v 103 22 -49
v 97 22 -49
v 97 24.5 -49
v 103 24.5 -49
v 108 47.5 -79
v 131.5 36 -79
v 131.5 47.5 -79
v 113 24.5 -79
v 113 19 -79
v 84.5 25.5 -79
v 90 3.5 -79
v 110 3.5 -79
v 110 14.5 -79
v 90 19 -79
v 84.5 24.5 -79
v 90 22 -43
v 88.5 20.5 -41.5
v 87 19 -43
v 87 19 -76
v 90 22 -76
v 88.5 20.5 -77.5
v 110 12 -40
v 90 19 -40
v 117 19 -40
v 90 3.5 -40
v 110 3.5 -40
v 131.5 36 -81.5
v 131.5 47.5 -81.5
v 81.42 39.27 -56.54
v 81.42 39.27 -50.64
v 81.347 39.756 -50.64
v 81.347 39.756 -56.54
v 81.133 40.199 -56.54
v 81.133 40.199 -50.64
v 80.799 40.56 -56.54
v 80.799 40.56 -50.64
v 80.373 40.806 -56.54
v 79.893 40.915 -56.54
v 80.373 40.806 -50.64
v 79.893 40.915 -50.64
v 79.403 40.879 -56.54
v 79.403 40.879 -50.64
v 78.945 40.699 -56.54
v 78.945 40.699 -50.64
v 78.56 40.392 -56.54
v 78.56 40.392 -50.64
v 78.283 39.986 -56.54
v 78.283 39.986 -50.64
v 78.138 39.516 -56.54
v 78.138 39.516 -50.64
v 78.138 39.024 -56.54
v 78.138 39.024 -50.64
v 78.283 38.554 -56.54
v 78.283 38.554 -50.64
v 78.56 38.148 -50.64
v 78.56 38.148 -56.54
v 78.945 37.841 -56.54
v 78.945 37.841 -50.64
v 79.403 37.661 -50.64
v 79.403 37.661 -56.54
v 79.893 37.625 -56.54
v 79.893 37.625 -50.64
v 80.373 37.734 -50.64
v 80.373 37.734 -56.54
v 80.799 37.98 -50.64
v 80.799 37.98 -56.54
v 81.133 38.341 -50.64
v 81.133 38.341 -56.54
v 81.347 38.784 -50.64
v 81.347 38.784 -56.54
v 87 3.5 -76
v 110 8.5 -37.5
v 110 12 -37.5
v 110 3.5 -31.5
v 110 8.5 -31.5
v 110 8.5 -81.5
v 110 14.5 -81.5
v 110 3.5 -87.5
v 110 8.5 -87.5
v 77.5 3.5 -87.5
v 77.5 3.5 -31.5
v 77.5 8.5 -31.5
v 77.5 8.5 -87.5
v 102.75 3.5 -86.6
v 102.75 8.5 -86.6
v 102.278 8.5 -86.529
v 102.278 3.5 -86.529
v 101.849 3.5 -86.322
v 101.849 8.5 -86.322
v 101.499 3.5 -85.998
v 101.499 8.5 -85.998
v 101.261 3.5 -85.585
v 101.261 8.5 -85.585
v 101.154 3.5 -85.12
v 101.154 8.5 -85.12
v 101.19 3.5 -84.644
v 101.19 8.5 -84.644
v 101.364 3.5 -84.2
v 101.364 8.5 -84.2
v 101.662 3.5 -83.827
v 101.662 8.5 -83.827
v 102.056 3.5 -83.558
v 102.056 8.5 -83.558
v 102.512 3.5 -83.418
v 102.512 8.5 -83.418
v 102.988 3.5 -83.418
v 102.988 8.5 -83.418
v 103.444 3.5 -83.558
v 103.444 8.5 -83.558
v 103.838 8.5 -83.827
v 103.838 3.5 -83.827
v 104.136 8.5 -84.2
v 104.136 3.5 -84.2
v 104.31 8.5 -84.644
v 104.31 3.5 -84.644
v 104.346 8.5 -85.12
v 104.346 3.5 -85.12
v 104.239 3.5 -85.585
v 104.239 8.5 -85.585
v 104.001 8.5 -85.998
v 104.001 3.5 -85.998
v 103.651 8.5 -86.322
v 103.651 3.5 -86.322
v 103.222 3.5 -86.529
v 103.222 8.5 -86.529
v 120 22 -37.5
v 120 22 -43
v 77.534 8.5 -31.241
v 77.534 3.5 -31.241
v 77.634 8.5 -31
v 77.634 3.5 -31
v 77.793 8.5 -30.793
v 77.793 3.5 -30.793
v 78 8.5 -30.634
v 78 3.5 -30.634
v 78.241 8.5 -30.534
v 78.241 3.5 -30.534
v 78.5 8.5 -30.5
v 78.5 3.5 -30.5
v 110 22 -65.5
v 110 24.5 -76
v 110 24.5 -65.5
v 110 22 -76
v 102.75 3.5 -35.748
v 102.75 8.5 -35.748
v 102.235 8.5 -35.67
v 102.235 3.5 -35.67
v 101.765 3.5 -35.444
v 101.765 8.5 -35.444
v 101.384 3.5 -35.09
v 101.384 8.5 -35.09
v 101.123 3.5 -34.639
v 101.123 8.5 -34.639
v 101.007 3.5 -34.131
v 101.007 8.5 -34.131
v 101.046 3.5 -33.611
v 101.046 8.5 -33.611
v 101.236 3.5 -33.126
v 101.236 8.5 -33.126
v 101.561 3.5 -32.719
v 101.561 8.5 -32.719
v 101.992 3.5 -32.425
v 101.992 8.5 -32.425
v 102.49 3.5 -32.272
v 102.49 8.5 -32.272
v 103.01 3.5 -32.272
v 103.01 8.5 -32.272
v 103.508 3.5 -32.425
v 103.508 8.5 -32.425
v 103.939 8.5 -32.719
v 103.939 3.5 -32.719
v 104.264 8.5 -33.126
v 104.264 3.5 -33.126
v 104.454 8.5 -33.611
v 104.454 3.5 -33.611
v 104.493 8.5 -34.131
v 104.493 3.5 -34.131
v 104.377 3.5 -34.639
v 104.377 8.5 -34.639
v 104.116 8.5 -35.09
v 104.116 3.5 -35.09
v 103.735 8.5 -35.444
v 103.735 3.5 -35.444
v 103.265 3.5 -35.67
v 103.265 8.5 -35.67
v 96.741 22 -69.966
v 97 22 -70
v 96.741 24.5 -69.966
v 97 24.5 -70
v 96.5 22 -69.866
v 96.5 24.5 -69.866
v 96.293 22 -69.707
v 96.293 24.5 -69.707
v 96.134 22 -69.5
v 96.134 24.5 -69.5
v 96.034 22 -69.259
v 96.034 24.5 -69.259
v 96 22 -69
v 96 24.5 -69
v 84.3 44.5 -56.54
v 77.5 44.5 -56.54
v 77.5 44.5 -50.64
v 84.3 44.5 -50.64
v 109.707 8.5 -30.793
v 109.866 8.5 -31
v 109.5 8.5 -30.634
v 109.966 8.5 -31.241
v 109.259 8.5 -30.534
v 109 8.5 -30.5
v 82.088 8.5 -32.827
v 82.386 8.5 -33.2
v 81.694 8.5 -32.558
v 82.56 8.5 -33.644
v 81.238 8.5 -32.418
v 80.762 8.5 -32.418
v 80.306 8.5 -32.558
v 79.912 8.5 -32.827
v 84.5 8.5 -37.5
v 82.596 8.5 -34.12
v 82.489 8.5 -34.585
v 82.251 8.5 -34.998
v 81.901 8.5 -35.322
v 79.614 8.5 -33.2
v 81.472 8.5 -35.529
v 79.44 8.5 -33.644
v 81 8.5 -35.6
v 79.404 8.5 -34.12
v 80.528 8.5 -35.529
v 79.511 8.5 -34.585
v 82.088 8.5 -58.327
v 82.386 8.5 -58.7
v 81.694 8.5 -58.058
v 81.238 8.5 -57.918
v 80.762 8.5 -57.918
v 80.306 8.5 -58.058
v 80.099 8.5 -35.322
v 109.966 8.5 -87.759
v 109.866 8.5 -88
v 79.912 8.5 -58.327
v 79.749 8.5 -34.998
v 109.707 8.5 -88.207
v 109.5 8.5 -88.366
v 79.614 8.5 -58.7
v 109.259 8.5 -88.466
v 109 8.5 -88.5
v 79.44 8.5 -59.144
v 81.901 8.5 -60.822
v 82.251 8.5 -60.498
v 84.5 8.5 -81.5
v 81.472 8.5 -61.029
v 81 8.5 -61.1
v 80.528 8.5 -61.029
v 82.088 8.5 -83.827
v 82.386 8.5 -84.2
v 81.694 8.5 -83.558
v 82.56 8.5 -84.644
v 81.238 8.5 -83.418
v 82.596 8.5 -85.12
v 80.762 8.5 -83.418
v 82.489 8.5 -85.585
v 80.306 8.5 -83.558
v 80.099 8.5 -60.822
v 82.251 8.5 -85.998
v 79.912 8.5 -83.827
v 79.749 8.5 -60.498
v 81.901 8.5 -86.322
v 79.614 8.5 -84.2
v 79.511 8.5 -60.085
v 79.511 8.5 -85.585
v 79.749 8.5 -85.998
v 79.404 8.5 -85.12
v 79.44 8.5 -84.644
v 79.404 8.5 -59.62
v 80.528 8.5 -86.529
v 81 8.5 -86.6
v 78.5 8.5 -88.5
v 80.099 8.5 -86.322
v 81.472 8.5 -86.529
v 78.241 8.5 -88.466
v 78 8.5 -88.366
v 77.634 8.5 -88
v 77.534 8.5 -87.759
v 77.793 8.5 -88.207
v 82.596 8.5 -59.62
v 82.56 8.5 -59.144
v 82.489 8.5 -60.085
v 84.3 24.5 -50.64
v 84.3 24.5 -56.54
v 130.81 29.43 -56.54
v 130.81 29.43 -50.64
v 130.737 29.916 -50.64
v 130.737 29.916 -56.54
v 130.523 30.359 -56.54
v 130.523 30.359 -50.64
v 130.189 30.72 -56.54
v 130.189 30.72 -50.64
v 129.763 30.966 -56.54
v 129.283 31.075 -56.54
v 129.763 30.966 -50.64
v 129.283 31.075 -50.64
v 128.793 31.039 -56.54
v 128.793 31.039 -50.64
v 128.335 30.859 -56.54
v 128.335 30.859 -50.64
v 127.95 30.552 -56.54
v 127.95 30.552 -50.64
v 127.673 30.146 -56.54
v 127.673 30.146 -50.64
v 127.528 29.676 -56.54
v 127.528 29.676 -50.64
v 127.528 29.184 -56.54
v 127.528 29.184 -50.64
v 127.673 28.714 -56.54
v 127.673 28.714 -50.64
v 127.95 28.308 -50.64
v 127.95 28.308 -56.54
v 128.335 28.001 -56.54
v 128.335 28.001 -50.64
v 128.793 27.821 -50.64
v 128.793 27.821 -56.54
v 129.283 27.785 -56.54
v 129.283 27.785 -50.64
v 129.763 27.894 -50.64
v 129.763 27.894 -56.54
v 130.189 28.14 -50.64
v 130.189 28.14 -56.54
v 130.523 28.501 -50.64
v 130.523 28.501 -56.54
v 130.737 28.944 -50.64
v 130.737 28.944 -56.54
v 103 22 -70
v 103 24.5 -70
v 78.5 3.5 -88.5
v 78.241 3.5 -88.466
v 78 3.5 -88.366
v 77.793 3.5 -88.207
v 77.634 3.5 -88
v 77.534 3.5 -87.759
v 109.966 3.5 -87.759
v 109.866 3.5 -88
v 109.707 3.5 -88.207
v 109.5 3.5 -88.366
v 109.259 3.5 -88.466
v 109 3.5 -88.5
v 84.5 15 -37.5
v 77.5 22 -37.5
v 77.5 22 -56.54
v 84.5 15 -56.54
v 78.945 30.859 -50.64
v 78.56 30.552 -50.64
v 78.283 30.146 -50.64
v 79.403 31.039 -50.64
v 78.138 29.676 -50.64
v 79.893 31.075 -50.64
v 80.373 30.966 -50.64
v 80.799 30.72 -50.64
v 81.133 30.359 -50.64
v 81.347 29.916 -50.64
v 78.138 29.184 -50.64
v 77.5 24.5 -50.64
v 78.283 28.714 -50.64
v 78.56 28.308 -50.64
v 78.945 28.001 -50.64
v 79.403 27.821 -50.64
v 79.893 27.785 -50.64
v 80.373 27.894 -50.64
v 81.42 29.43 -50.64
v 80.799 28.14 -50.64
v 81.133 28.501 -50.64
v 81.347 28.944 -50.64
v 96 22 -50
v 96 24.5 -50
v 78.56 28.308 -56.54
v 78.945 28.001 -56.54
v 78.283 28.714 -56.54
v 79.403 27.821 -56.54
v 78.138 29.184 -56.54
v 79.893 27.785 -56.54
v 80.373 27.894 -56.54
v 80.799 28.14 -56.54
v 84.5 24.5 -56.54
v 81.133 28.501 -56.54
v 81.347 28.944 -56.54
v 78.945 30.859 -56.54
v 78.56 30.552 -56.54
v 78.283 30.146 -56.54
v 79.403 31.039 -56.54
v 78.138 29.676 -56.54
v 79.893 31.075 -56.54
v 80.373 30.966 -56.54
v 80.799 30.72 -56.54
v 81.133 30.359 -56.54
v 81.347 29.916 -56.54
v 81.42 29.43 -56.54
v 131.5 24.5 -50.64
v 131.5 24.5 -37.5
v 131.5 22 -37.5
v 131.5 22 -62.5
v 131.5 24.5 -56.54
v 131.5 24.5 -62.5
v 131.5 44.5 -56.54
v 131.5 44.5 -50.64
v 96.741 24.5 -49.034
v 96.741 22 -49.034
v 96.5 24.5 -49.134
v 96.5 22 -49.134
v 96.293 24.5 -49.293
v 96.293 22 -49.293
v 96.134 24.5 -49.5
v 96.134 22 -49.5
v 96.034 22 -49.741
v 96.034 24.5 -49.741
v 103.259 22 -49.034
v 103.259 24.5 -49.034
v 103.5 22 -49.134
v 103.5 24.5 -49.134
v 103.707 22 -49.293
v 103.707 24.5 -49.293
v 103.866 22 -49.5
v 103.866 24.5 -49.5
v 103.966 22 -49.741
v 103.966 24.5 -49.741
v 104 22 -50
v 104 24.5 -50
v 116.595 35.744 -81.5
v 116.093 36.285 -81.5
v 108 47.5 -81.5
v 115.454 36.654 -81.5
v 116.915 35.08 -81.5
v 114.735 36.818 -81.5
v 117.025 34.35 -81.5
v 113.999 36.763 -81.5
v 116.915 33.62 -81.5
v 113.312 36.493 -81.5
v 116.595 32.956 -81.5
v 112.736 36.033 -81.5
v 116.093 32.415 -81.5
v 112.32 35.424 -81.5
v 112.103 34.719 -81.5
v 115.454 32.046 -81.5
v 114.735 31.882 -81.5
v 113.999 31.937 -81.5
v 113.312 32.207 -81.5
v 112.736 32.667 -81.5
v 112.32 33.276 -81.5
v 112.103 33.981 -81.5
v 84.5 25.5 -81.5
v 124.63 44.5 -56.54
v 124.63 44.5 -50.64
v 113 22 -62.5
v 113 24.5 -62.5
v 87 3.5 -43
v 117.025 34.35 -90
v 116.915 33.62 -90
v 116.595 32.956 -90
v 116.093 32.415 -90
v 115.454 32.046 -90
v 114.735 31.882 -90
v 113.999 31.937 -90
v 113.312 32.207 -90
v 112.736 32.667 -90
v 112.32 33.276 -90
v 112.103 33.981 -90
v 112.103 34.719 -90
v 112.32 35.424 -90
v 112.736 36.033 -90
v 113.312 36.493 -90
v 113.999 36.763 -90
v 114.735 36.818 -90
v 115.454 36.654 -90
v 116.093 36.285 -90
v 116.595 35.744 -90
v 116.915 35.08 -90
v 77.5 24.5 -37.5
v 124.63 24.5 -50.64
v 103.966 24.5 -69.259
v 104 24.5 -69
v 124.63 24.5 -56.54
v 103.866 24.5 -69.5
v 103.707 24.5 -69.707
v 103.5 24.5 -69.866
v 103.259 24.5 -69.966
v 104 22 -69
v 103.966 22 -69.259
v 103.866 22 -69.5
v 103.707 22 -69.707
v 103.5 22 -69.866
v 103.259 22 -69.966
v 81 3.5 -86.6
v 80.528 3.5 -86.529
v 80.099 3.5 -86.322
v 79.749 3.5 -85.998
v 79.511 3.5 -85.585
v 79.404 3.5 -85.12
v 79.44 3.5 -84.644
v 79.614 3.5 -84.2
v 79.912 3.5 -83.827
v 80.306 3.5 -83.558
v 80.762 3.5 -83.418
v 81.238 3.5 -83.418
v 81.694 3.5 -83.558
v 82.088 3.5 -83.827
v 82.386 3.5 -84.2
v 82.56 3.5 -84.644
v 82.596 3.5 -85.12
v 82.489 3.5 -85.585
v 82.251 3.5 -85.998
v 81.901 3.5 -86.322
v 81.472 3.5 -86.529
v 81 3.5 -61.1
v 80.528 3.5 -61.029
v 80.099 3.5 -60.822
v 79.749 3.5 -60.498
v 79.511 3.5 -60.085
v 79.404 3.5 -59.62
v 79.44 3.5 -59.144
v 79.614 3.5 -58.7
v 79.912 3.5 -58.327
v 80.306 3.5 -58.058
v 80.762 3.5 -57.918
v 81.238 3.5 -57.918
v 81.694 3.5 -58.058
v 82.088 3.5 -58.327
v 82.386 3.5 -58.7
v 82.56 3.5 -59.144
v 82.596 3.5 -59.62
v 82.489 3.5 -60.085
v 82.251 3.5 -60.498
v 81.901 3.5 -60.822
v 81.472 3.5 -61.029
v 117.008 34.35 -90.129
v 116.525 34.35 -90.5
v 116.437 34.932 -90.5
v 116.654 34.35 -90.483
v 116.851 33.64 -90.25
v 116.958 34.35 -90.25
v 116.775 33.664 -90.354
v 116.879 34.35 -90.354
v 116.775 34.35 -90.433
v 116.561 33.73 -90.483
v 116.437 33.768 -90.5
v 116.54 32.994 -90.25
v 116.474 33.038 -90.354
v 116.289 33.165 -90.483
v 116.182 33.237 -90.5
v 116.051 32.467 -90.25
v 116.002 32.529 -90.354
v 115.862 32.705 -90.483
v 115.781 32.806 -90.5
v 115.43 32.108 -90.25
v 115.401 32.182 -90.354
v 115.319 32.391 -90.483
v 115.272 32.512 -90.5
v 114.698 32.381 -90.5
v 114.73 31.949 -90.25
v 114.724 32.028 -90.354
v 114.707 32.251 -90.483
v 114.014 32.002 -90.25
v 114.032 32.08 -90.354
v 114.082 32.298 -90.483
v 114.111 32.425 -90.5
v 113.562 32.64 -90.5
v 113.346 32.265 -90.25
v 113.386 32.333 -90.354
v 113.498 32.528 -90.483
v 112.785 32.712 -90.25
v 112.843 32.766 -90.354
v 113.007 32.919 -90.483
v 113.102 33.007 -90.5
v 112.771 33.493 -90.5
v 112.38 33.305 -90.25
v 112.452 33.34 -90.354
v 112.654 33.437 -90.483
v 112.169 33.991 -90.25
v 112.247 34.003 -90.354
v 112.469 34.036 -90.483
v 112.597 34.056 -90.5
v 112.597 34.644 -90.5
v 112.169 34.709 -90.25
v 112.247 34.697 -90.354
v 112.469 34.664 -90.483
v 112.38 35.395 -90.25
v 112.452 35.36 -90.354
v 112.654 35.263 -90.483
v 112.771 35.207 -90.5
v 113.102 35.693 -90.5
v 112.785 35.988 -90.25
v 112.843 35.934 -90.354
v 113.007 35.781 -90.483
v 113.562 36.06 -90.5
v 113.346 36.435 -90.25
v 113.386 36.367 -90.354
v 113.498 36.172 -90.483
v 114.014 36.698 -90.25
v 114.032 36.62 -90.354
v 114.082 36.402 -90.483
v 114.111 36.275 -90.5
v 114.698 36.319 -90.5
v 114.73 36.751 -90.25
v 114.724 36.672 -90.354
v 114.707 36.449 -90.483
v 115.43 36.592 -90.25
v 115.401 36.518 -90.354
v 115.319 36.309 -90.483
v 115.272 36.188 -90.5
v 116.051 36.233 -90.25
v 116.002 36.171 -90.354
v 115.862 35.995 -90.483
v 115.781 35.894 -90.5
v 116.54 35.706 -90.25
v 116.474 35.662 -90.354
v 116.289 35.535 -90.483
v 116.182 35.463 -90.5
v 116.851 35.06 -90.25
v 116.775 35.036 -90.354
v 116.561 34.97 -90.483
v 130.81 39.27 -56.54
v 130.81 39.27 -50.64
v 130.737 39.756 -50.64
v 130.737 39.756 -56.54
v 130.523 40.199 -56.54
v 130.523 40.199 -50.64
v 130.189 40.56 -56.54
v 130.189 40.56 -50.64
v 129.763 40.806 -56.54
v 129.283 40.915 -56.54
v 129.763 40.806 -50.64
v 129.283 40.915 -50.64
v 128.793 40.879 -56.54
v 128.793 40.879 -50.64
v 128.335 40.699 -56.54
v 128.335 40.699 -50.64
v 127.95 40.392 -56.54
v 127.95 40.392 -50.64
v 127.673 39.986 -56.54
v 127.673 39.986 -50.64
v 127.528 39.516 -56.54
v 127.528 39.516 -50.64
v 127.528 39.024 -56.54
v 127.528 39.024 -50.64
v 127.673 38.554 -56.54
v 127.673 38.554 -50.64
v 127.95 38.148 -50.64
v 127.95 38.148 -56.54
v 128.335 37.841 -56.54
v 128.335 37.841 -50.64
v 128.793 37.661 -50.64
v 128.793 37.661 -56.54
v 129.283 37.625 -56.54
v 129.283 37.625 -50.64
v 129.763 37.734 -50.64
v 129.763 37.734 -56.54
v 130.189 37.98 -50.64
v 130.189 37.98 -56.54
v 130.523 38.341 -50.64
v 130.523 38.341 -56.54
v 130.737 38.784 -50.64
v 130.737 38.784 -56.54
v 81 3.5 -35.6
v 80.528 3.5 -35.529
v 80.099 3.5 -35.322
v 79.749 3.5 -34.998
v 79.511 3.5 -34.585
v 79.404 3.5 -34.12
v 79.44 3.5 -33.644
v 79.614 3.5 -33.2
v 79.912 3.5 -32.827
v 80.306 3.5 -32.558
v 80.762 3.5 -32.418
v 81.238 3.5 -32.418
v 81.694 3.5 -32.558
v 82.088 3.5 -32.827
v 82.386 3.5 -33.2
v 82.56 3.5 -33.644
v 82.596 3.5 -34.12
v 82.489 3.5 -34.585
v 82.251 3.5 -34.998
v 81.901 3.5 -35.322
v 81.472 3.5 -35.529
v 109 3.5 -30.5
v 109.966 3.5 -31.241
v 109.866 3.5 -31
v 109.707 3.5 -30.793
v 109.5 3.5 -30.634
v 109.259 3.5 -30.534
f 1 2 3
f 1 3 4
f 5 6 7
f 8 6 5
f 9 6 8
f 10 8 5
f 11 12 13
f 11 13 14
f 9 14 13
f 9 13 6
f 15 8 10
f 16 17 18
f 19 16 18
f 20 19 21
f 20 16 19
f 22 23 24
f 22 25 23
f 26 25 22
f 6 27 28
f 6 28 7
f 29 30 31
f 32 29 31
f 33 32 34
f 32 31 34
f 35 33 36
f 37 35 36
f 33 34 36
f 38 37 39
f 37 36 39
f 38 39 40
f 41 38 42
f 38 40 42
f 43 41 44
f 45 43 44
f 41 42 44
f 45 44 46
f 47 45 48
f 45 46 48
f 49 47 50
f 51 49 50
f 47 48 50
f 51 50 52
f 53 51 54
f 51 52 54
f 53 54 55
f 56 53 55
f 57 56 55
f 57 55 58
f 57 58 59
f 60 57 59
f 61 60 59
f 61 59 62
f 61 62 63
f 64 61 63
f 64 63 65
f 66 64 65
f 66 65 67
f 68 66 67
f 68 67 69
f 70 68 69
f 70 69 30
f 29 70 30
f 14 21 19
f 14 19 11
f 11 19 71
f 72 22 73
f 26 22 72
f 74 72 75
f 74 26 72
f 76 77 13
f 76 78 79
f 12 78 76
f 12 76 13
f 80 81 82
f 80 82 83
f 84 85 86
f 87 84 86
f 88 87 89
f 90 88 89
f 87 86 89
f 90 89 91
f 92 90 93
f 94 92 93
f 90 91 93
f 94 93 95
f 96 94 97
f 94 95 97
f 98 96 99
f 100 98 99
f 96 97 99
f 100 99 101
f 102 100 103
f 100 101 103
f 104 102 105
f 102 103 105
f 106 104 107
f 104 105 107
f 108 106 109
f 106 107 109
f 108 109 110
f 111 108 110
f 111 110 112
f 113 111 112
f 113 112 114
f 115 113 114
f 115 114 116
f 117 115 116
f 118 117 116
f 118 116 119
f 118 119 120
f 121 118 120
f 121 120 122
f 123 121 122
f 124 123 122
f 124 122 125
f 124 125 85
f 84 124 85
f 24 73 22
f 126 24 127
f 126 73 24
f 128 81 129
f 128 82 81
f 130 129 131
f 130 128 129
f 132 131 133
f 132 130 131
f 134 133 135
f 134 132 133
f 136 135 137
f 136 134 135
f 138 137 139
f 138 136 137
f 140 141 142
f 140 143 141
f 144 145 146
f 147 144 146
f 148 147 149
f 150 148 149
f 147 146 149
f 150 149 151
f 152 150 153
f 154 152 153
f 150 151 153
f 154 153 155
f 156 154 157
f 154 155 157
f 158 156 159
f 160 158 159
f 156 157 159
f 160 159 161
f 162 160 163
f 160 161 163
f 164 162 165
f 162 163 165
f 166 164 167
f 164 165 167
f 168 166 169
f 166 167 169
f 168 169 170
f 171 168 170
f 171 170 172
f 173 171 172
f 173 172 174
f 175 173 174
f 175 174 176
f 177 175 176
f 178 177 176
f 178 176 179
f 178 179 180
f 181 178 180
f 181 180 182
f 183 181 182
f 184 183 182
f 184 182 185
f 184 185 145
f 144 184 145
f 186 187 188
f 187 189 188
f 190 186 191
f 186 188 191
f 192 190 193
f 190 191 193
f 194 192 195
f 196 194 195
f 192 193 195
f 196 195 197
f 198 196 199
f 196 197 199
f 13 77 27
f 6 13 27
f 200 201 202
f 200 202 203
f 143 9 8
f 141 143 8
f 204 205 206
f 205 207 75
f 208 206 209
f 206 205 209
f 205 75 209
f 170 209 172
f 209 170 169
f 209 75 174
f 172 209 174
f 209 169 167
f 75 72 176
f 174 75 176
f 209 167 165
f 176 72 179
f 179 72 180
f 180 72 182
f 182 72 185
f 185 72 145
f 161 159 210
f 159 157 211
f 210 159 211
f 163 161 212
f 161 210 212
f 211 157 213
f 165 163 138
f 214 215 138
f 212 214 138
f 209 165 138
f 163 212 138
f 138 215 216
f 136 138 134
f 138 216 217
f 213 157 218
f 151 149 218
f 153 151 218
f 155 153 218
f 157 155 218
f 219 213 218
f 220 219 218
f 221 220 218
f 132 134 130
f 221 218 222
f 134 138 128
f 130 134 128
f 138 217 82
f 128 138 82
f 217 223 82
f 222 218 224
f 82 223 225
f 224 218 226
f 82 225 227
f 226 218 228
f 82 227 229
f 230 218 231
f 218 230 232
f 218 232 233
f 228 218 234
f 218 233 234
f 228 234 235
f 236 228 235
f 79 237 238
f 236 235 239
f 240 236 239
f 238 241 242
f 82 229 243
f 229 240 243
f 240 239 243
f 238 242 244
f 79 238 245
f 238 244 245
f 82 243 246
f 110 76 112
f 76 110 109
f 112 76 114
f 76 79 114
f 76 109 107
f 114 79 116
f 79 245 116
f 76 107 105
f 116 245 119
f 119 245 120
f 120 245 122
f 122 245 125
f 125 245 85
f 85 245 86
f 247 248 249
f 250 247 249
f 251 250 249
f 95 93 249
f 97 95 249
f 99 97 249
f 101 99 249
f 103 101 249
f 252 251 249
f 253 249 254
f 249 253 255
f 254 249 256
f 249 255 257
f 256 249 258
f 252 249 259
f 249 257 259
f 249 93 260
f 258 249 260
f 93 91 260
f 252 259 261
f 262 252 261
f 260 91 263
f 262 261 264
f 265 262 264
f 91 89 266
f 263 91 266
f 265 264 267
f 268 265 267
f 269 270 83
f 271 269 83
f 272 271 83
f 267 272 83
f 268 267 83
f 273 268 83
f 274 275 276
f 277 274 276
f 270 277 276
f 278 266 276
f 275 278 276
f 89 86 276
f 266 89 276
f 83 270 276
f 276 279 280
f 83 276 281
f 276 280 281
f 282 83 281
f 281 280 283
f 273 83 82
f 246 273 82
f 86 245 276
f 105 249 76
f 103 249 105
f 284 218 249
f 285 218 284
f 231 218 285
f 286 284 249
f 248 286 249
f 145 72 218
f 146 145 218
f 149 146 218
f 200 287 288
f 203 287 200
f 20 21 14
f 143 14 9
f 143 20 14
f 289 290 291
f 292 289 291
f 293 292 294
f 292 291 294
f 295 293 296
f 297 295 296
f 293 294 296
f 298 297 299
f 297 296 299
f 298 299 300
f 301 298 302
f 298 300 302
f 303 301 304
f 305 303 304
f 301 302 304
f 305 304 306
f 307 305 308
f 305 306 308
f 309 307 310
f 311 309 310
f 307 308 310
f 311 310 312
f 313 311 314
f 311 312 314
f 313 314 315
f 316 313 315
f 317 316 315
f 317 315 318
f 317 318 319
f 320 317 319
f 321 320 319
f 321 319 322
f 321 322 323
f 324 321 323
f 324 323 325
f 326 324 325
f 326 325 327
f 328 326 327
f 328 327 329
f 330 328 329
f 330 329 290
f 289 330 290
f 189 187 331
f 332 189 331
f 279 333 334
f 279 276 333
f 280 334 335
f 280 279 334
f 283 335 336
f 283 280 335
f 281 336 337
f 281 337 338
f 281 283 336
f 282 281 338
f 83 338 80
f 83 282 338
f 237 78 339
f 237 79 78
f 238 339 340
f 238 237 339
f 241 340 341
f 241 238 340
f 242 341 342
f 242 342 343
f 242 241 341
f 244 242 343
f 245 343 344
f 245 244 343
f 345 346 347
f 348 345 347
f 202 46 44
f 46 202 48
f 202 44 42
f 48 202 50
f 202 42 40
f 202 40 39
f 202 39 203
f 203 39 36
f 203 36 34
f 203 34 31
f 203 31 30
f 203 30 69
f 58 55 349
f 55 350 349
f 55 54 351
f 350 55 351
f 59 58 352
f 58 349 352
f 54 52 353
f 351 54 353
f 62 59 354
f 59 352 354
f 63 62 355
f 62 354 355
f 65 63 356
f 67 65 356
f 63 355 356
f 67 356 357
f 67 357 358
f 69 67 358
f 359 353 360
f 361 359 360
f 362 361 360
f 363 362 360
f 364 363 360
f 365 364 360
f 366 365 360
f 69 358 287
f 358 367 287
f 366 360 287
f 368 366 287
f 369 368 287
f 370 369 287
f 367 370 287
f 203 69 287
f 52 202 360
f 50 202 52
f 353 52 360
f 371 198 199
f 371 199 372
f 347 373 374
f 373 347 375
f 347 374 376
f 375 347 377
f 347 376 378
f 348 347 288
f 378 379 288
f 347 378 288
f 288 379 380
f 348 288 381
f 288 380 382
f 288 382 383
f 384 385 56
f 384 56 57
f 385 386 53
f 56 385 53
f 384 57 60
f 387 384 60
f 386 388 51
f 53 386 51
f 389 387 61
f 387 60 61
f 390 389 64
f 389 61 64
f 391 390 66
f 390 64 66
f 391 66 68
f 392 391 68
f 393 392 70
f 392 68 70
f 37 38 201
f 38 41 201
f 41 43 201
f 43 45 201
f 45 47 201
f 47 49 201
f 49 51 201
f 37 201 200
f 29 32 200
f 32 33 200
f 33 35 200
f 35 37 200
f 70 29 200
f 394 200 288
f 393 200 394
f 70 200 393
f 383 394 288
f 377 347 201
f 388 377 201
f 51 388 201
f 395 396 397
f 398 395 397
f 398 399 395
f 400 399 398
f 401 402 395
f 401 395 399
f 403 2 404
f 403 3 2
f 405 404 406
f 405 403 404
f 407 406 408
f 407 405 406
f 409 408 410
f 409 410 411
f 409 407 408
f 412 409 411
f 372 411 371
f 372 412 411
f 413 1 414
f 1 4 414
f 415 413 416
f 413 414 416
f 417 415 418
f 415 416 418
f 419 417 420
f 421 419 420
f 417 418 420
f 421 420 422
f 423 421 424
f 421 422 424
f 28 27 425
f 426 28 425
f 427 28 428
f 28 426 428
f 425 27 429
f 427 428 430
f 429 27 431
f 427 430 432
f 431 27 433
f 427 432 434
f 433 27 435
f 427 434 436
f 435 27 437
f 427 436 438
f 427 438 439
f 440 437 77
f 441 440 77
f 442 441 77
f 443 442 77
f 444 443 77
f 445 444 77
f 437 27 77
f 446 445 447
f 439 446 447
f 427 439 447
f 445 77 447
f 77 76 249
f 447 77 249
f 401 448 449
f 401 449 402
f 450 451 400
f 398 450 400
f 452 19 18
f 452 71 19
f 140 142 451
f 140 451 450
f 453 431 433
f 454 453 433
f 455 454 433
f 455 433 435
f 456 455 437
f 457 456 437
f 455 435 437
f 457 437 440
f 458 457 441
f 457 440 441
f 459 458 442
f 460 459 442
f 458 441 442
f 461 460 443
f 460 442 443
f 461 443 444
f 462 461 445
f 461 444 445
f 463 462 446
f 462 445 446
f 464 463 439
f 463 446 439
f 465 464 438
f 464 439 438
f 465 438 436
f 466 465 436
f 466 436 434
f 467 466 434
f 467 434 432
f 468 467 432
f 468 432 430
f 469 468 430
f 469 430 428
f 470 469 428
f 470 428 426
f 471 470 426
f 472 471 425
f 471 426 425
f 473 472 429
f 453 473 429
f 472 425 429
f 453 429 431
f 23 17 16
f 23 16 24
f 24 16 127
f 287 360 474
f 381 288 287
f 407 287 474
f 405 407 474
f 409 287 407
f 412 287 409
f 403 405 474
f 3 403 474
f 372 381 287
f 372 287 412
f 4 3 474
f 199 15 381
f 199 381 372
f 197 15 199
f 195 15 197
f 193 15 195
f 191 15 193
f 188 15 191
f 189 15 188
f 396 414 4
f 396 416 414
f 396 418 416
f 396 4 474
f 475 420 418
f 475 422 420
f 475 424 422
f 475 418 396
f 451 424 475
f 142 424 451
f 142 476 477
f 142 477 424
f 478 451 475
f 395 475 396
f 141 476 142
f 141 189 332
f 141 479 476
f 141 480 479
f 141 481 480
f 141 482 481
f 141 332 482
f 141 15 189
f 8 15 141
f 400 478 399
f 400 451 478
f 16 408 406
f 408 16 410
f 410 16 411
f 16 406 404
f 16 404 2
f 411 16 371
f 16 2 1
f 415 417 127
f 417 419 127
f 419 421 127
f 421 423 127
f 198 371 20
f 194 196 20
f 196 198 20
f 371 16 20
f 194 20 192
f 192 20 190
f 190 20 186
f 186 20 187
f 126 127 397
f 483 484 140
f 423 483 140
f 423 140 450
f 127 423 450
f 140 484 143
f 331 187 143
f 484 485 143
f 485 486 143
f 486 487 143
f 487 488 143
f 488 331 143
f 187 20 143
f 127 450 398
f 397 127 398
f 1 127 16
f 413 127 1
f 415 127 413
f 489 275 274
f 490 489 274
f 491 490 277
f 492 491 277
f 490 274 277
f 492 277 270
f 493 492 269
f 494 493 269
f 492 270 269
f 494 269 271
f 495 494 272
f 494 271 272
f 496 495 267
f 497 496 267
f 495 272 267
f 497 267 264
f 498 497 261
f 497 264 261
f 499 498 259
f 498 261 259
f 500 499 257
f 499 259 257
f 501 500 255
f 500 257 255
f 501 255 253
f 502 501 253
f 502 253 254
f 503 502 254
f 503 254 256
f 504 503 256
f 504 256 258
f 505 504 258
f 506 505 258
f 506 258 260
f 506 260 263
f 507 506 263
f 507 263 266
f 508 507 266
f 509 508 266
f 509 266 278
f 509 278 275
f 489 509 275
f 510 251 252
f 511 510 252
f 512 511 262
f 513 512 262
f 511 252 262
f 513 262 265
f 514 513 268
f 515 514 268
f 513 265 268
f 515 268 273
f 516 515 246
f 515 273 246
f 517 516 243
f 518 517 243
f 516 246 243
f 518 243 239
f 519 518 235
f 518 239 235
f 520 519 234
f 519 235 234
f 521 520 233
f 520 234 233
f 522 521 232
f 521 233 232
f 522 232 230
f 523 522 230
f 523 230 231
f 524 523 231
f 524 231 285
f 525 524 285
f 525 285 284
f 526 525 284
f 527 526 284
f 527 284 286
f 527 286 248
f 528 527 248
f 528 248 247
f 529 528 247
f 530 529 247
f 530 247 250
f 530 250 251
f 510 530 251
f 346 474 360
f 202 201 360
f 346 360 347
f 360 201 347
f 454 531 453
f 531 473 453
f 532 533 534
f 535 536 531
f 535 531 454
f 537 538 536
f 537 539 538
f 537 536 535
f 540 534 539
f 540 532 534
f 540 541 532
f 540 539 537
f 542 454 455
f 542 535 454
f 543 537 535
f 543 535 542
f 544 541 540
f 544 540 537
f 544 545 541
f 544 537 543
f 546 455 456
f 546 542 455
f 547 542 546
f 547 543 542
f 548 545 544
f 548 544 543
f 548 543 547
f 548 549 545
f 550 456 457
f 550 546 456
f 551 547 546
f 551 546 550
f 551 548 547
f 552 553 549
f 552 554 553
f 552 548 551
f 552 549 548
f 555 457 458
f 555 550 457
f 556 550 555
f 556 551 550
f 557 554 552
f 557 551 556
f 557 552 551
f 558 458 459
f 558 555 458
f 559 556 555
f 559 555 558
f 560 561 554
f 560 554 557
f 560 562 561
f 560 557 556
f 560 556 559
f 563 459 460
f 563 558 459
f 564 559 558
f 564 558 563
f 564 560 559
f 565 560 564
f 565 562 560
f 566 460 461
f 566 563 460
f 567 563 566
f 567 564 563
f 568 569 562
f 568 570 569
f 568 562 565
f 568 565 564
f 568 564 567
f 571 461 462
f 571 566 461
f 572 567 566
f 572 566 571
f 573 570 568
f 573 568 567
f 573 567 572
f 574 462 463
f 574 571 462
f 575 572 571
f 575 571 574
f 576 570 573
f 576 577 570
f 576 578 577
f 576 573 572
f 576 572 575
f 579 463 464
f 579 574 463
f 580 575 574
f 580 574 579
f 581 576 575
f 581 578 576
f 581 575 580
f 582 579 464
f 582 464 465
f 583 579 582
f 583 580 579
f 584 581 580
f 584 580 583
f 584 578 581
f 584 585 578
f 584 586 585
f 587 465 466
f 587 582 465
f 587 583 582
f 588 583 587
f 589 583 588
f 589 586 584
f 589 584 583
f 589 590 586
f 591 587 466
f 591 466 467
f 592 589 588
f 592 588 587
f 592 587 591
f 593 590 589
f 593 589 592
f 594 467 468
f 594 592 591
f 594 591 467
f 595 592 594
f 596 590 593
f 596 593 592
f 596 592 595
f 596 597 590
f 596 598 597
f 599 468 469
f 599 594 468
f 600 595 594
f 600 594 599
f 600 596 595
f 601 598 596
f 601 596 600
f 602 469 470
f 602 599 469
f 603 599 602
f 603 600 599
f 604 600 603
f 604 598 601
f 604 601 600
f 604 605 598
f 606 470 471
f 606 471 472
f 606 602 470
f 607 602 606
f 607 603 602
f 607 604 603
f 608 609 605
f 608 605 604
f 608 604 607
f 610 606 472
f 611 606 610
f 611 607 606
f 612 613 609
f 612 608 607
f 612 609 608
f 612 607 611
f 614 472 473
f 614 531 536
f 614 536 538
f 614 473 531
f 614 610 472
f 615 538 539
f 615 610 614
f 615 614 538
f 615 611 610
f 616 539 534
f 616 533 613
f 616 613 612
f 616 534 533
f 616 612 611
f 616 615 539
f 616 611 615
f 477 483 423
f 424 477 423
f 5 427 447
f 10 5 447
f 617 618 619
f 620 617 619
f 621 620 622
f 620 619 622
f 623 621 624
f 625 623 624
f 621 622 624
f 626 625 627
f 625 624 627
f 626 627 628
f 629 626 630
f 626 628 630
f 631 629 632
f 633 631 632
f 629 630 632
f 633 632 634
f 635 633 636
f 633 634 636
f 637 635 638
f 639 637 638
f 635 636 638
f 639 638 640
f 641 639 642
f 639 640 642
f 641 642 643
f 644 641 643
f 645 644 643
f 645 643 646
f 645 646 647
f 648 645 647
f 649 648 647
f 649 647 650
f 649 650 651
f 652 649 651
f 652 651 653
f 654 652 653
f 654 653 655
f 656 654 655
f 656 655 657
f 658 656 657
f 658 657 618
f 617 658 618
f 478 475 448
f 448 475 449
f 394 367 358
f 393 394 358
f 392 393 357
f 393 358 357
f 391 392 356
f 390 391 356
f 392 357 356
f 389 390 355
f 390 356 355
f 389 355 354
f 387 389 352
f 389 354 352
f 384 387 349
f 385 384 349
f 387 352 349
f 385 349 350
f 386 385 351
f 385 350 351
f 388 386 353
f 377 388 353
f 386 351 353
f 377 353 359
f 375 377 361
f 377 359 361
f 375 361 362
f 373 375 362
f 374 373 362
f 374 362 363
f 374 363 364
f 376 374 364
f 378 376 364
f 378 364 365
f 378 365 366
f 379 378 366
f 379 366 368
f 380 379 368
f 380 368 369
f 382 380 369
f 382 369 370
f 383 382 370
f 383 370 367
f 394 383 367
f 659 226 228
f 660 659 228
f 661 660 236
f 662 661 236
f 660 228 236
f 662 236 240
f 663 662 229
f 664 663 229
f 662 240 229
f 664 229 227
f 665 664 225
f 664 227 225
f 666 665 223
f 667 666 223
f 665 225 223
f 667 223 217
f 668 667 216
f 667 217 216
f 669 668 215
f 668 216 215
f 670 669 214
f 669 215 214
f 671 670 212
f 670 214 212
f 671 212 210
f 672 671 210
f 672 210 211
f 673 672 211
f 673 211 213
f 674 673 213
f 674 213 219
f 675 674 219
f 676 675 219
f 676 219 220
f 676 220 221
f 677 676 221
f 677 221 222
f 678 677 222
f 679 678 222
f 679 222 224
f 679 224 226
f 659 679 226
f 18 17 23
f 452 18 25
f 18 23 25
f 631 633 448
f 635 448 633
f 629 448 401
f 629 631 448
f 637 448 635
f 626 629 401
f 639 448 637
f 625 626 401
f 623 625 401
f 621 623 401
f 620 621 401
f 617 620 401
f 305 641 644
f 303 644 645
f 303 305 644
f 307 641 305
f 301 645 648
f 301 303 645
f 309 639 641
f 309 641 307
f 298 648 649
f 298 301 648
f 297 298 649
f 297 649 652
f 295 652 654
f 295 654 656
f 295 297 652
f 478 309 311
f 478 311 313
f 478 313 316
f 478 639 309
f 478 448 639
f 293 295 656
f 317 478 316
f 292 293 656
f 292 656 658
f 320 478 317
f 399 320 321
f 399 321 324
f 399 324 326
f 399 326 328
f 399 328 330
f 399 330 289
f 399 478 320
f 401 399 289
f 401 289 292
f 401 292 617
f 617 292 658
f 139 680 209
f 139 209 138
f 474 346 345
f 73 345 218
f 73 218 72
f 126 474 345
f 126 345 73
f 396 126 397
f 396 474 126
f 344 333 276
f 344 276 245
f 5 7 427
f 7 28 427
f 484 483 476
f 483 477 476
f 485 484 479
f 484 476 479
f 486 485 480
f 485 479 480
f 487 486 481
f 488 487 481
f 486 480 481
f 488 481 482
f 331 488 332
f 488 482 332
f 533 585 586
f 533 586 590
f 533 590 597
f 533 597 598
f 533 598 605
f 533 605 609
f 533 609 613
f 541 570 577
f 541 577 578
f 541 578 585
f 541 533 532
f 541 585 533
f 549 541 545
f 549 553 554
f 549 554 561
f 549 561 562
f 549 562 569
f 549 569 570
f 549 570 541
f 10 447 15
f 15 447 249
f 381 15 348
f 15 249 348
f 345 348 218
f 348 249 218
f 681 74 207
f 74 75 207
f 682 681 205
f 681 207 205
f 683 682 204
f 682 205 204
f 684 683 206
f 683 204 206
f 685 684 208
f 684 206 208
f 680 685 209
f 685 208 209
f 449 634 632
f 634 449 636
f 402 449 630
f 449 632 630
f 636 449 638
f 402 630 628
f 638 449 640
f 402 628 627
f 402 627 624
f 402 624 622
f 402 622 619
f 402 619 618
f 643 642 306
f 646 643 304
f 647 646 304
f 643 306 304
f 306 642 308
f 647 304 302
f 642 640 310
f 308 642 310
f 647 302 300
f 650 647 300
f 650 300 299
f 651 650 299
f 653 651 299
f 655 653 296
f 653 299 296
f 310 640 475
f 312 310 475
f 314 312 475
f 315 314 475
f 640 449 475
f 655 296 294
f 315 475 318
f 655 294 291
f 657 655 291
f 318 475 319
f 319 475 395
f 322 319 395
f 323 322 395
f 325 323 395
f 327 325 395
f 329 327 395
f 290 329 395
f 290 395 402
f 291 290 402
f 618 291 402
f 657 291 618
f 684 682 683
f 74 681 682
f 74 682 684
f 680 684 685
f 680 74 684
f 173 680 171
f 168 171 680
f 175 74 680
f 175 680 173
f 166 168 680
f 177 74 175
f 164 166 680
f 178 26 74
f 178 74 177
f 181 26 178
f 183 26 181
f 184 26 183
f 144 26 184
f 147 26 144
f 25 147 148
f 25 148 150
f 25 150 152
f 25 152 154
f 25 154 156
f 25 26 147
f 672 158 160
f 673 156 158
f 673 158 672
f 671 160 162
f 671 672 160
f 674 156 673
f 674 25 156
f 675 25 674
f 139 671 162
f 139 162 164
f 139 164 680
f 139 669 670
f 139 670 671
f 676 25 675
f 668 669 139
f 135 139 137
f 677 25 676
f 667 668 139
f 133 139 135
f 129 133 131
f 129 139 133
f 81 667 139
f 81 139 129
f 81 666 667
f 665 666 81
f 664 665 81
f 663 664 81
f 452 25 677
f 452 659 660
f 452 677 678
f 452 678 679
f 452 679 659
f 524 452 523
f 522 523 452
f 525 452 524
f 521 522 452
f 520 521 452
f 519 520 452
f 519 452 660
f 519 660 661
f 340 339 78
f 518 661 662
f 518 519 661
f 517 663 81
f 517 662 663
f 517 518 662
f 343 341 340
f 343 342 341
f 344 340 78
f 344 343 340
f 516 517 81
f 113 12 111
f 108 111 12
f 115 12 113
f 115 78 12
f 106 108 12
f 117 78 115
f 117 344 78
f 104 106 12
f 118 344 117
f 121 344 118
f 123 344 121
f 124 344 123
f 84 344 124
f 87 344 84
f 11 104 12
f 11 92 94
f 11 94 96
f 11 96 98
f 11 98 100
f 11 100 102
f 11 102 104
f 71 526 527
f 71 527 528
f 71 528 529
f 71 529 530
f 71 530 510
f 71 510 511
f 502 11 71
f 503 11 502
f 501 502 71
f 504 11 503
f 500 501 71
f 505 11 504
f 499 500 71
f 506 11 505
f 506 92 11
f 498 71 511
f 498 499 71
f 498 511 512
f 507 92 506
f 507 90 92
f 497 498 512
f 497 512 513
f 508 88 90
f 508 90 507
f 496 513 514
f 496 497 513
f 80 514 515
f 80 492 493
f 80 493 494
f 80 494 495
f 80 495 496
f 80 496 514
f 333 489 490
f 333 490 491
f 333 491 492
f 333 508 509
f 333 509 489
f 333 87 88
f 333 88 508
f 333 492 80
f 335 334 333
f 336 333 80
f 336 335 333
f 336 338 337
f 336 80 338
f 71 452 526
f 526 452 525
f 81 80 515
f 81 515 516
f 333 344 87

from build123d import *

# Parameters (mm, degrees)
BOSS_EXTRUDE1_DEPTH = 3.5
BOSS_EXTRUDE2_DEPTH = 21
SKETCH3_W           = 23
SKETCH3_H           = 39
BOSS_EXTRUDE3_DEPTH = 2.5
SKETCH5_W           = 21.5
SKETCH5_H           = 25
SKETCH5_W_2         = 7.07
SKETCH5_H_2         = 19.04
BOSS_EXTRUDE5_DEPTH = 2.5
SKETCH6_W           = 7.07
SKETCH6_H           = 5.9
BOSS_EXTRUDE6_DEPTH = 20
BOSS_EXTRUDE7_DEPTH = 23
FILLET1_SIZE        = 10
SKETCH9_R           = 2.475
BOSS_EXTRUDE8_DEPTH = 9
FILLET2_R           = 0.5
SKETCH10_R          = 1.65
CUT_EXTRUDE1_DEPTH  = 9
SKETCH11_W          = 0.2
SKETCH11_H          = 20
CUT_EXTRUDE2_DEPTH  = 9
CUT_EXTRUDE3_DEPTH  = 9
FILLET3_SIZE        = 3
BOSS_EXTRUDE9_DEPTH = 5
SKETCH14_R          = 1.747814763
SKETCH14_R_2        = 1.6
CUT_EXTRUDE4_DEPTH  = 15
SKETCH15_W          = 110
SKETCH15_H          = 3.5
CUT_EXTRUDE5_DEPTH  = 150
FILLET4_SIZE        = 7
FILLET5_SIZE        = 3
FILLET6_SIZE        = 3
SKETCH17_W          = 8
SKETCH17_H          = 21
CUT_EXTRUDE6_DEPTH  = 150
FILLET7_R           = 1
FILLET8_R           = 1
FILLET9_SIZE        = 3


# Some blends are built 0.0001 mm under size
with BuildPart() as part:
    # Sketch1 → Boss-Extrude1 (new body)
    with BuildSketch(Plane(origin=(0, 0, 0), x_dir=(1, 0, 0), z_dir=(0, 1, 0))):
        Polygon((0, 40), (23, 40), (23, 79), (0, 79), (0, 100), (110, 100), (110, 79), (87, 79), (87, 40), (110, 40), (110, 20), (80, 0), (30, 0), (0, 20), align=None)
    extrude(amount=BOSS_EXTRUDE1_DEPTH)

    # Sketch2 → Boss-Extrude2 (add)
    with BuildSketch(Plane(origin=(0, 3.5, 0), x_dir=(1, 0, 0), z_dir=(0, 1, 0))):
        Polygon((0, 79), (23, 79), (23, 40), (0, 40), (0, 37.5), (25.5, 37.5), (25.5, 81.5), (0, 81.5), align=None)
        Polygon((110, 81.5), (84.5, 81.5), (84.5, 37.5), (110, 37.5), (110, 40), (87, 40), (87, 79), (110, 79), align=None)
    extrude(amount=BOSS_EXTRUDE2_DEPTH)

    # Sketch3 → Boss-Extrude3 (add)
    with BuildSketch(Plane(origin=(0, 24.5, 0), x_dir=(1, 0, 0), z_dir=(0, 1, 0))):
        with Locations((11.5, 59.5)):
            Rectangle(SKETCH3_W, SKETCH3_H)
        with Locations((98.5, 59.5)):
            Rectangle(SKETCH3_W, SKETCH3_H)
    extrude(amount=-BOSS_EXTRUDE3_DEPTH)

    # Sketch5 → Boss-Extrude5 (add)
    with BuildSketch(Plane(origin=(0, 24.5, 0), x_dir=(1, 0, 0), z_dir=(0, 1, 0))):
        with Locations((120.75, 50)):
            Rectangle(SKETCH5_W, SKETCH5_H)
        with Locations((-10.75, 50)):
            Rectangle(SKETCH5_W, SKETCH5_H)
        with Locations((29.035, 47.02)):
            Rectangle(SKETCH5_W_2, SKETCH5_H_2)
        with Locations((80.965, 47.02)):
            Rectangle(SKETCH5_W_2, SKETCH5_H_2)
    extrude(amount=-BOSS_EXTRUDE5_DEPTH)

    # Sketch6 → Boss-Extrude6 (add)
    with BuildSketch(Plane(origin=(0, 24.5, 0), x_dir=(1, 0, 0), z_dir=(0, 1, 0))):
        with Locations((29.035, 53.59)):
            Rectangle(SKETCH6_W, SKETCH6_H)
        with Locations((80.965, 53.59)):
            Rectangle(SKETCH6_W, SKETCH6_H)
        with Locations((-17.965, 53.59)):
            Rectangle(SKETCH6_W, SKETCH6_H)
        with Locations((127.965, 53.59)):
            Rectangle(SKETCH6_W, SKETCH6_H)
    extrude(amount=BOSS_EXTRUDE6_DEPTH)

    # Sketch7 → Boss-Extrude7 (add)
    with BuildSketch(Plane(origin=(0, 24.5, 0), x_dir=(1, 0, 0), z_dir=(0, 1, 0))):
        Polygon((0, 81.5), (25.5, 81.5), (25.5, 79), (0, 79), (-21.5, 79), (-21.5, 81.5), align=None)
        Polygon((110, 79), (84.5, 79), (84.5, 81.5), (110, 81.5), (131.5, 81.5), (131.5, 79), align=None)
    extrude(amount=BOSS_EXTRUDE7_DEPTH)

    # Fillet1
    # the kernel refuses this chamfer: 10 mm, written as the material it adds along each edge
    with BuildSketch(Plane(origin=(0, 22, -40), x_dir=(0.027495876610586372, -0.9996219169112968, 0), z_dir=(0, 0, 1)), Plane(origin=(110, 22, -37.5), x_dir=(-0.027495876610586317, -0.9996219169112968, 0), z_dir=(0, 0, -1)), Plane(origin=(110, 24.5, -81.5), x_dir=(0.9996219169112968, 0.027495876610586317, 0), z_dir=(0, 0, 1))) as fillet1_piece_1:
        Polygon((FILLET1_SIZE * 0.999621916911, -FILLET1_SIZE * 0.0274958766106), (-FILLET1_SIZE * 0.0274958766106, -FILLET1_SIZE * 0.999621916911), (0, 0), align=None)
    extrude(amount=2.5)
    with BuildSketch(Plane(origin=(0, 24.5, -79), x_dir=(0.027495876610586372, -0.9996219169112968, 0), z_dir=(0, 0, -1))) as fillet1_piece_2:
        Polygon((FILLET1_SIZE * 0.999621916911, FILLET1_SIZE * 0.0274958766106), (-FILLET1_SIZE * 0.0274958766106, FILLET1_SIZE * 0.999621916911), (0, 0), align=None)
    extrude(amount=2.5)

    # Sketch9 → Boss-Extrude8 (add)
    with BuildSketch(Plane(origin=(0, 0, -81.5), x_dir=(-1, 0, 0), z_dir=(0, 0, -1))):
        with Locations(Location((-114.55, 34.35, 0), (0, 0, 180))):
            Circle(SKETCH9_R)
        with Locations(Location((4.55, 34.35, 0), (0, 0, 180))):
            Circle(SKETCH9_R)
    extrude(amount=BOSS_EXTRUDE8_DEPTH)

    # Fillet2
    fillet2_edges = [part.edges().sort_by_distance(p)[0] for p in [
        (112.075, 34.35, -90.5),
        (-7.025, 34.35, -90.5),
    ]]
    fillet(fillet2_edges, radius=FILLET2_R)

    # Sketch10 → Cut-Extrude1 (cut)
    with BuildSketch(Plane.XY.offset(-50.64)):
        with Locations((129.16, 39.27)):
            Circle(SKETCH10_R)
        with Locations((129.16, 29.43)):
            Circle(SKETCH10_R)
        with Locations((79.77, 39.27)):
            Circle(SKETCH10_R)
        with Locations((79.77, 29.43)):
            Circle(SKETCH10_R)
        with Locations((-19.16, 29.43)):
            Circle(SKETCH10_R)
        with Locations((-19.16, 39.27)):
            Circle(SKETCH10_R)
        with Locations(Location((30.23, 39.27, 0), (0, 0, 180))):
            Circle(SKETCH10_R)
        with Locations(Location((30.23, 29.43, 0), (0, 0, 180))):
            Circle(SKETCH10_R)
    extrude(amount=-CUT_EXTRUDE1_DEPTH, mode=Mode.SUBTRACT)

    # Sketch11 → Cut-Extrude2 (cut)
    with BuildSketch(Plane.XY.offset(-50.64)):
        with Locations((-14.53, 34.5)):
            Rectangle(SKETCH11_W, SKETCH11_H)
        with Locations((25.6, 34.5)):
            Rectangle(SKETCH11_W, SKETCH11_H)
        with Locations((84.4, 34.5)):
            Rectangle(SKETCH11_W, SKETCH11_H)
        with Locations((124.53, 34.5)):
            Rectangle(SKETCH11_W, SKETCH11_H)
    extrude(amount=-CUT_EXTRUDE2_DEPTH, mode=Mode.SUBTRACT)

    # Sketch12 → Cut-Extrude3 (cut)
    with BuildSketch(Plane(origin=(0, 0, -81.5), x_dir=(-1, 0, 0), z_dir=(0, 0, -1))):
        Polygon((-108, 47.5), (-84.5, 25.5), (-84.5, 47.5), align=None)
        Polygon((-25.5, 25.5), (-25.5, 47.5), (-2, 47.5), align=None)
        Polygon((-120, 24.5), (-131.5, 36), (-131.5, 24.5), align=None)
        Polygon((10, 24.5), (21.5, 36), (21.5, 24.5), align=None)
    extrude(amount=-CUT_EXTRUDE3_DEPTH, mode=Mode.SUBTRACT)

    # Fillet3
    fillet3_edges = [part.edges().sort_by_distance(p)[0] for p in [
        (0, 23.25, -62.5),
        (110, 23.25, -62.5),
    ]]
    chamfer(fillet3_edges, length=FILLET3_SIZE)

    # Sketch13 → Boss-Extrude9 (add)
    with BuildSketch(Plane(origin=(0, 3.5, 0), x_dir=(1, 0, 0), z_dir=(0, 1, 0))):
        Polygon((0, 30.5), (32.5, 30.5), (32.5, 88.5), (0, 88.5), (0, 81.5), (25.5, 81.5), (25.5, 37.5), (0, 37.5), align=None)
        Polygon((84.5, 37.5), (110, 37.5), (110, 30.5), (77.5, 30.5), (77.5, 88.5), (110, 88.5), (110, 81.5), (84.5, 81.5), align=None)
    extrude(amount=BOSS_EXTRUDE9_DEPTH)

    # Sketch14 → Cut-Extrude4 (cut)
    with BuildSketch(Plane(origin=(0, 8.5, 0), x_dir=(1, 0, 0), z_dir=(0, 1, 0))):
        with Locations(Location((7.25, 34, 0), (0, 0, 270))):
            Circle(SKETCH14_R)
        with Locations(Location((7.25, 85, 0), (0, 0, 270))):
            Circle(SKETCH14_R_2)
        with Locations(Location((29, 34, 0), (0, 0, 270))):
            Circle(SKETCH14_R_2)
        with Locations(Location((29, 59.5, 0), (0, 0, 270))):
            Circle(SKETCH14_R_2)
        with Locations(Location((29, 85, 0), (0, 0, 270))):
            Circle(SKETCH14_R_2)
        with Locations(Location((81, 34, 0), (0, 0, 90))):
            Circle(SKETCH14_R_2)
        with Locations(Location((102.75, 34, 0), (0, 0, 90))):
            Circle(SKETCH14_R)
        with Locations(Location((81, 59.5, 0), (0, 0, 90))):
            Circle(SKETCH14_R_2)
        with Locations(Location((81, 85, 0), (0, 0, 90))):
            Circle(SKETCH14_R_2)
        with Locations(Location((102.75, 85, 0), (0, 0, 90))):
            Circle(SKETCH14_R_2)
    extrude(amount=-CUT_EXTRUDE4_DEPTH, mode=Mode.SUBTRACT)

    # Sketch15 → Cut-Extrude5 (cut)
    with BuildSketch(Plane(origin=(0, 0, -100), x_dir=(-1, 0, 0), z_dir=(0, 0, -1))):
        Polygon((-77.5, 47.5), (-77.5, 3.5), (0, 3.5), (21.5, 3.5), (21.5, 47.5), align=None)
        with Locations((-55, 1.75)):
            Rectangle(SKETCH15_W, SKETCH15_H)
    extrude(amount=-CUT_EXTRUDE5_DEPTH, mode=Mode.SUBTRACT)

    # Fillet4
    fillet4_edges = [part.edges().sort_by_distance(p)[0] for p in [
        (84.5, 22, -47.02),
    ]]
    chamfer(fillet4_edges, length=FILLET4_SIZE - 0.0001)  # a hair under: the kernel refuses the full size

    # Fillet5
    fillet5_edges = [part.edges().sort_by_distance(p)[0] for p in [
        (87, 22, -59.5),
        (98.5, 22, -79),
        (103.5, 22, -40),
    ]]
    chamfer(fillet5_edges, length=FILLET5_SIZE)

    # Fillet6
    fillet6_edges = [part.edges().sort_by_distance(p)[0] for p in [
        (110, 21.75, -79),
    ]]
    chamfer(fillet6_edges, length=FILLET6_SIZE)

    # Sketch17 → Cut-Extrude6 (cut)
    with BuildSketch(Plane.XZ.offset(-22)):
        with Locations((100, -59.5)):
            Rectangle(SKETCH17_W, SKETCH17_H)
    extrude(amount=-CUT_EXTRUDE6_DEPTH, mode=Mode.SUBTRACT)

    # Fillet7
    fillet7_edges = [part.edges().sort_by_distance(p)[0] for p in [
        (96, 23.25, -70),
        (96, 23.25, -49),
        (104, 23.25, -49),
        (104, 23.25, -70),
    ]]
    fillet(fillet7_edges, radius=FILLET7_R)

    # Fillet8
    fillet8_edges = [part.edges().sort_by_distance(p)[0] for p in [
        (110, 6, -88.5),
        (77.5, 6, -88.5),
        (77.5, 6, -30.5),
        (110, 6, -30.5),
    ]]
    fillet(fillet8_edges, radius=FILLET8_R)

    # Fillet9
    fillet9_edges = [part.edges().sort_by_distance(p)[0] for p in [
        (87, 11.25, -79),
        (87, 11.25, -40),
    ]]
    chamfer(fillet9_edges, length=FILLET9_SIZE)


solid = part.part
